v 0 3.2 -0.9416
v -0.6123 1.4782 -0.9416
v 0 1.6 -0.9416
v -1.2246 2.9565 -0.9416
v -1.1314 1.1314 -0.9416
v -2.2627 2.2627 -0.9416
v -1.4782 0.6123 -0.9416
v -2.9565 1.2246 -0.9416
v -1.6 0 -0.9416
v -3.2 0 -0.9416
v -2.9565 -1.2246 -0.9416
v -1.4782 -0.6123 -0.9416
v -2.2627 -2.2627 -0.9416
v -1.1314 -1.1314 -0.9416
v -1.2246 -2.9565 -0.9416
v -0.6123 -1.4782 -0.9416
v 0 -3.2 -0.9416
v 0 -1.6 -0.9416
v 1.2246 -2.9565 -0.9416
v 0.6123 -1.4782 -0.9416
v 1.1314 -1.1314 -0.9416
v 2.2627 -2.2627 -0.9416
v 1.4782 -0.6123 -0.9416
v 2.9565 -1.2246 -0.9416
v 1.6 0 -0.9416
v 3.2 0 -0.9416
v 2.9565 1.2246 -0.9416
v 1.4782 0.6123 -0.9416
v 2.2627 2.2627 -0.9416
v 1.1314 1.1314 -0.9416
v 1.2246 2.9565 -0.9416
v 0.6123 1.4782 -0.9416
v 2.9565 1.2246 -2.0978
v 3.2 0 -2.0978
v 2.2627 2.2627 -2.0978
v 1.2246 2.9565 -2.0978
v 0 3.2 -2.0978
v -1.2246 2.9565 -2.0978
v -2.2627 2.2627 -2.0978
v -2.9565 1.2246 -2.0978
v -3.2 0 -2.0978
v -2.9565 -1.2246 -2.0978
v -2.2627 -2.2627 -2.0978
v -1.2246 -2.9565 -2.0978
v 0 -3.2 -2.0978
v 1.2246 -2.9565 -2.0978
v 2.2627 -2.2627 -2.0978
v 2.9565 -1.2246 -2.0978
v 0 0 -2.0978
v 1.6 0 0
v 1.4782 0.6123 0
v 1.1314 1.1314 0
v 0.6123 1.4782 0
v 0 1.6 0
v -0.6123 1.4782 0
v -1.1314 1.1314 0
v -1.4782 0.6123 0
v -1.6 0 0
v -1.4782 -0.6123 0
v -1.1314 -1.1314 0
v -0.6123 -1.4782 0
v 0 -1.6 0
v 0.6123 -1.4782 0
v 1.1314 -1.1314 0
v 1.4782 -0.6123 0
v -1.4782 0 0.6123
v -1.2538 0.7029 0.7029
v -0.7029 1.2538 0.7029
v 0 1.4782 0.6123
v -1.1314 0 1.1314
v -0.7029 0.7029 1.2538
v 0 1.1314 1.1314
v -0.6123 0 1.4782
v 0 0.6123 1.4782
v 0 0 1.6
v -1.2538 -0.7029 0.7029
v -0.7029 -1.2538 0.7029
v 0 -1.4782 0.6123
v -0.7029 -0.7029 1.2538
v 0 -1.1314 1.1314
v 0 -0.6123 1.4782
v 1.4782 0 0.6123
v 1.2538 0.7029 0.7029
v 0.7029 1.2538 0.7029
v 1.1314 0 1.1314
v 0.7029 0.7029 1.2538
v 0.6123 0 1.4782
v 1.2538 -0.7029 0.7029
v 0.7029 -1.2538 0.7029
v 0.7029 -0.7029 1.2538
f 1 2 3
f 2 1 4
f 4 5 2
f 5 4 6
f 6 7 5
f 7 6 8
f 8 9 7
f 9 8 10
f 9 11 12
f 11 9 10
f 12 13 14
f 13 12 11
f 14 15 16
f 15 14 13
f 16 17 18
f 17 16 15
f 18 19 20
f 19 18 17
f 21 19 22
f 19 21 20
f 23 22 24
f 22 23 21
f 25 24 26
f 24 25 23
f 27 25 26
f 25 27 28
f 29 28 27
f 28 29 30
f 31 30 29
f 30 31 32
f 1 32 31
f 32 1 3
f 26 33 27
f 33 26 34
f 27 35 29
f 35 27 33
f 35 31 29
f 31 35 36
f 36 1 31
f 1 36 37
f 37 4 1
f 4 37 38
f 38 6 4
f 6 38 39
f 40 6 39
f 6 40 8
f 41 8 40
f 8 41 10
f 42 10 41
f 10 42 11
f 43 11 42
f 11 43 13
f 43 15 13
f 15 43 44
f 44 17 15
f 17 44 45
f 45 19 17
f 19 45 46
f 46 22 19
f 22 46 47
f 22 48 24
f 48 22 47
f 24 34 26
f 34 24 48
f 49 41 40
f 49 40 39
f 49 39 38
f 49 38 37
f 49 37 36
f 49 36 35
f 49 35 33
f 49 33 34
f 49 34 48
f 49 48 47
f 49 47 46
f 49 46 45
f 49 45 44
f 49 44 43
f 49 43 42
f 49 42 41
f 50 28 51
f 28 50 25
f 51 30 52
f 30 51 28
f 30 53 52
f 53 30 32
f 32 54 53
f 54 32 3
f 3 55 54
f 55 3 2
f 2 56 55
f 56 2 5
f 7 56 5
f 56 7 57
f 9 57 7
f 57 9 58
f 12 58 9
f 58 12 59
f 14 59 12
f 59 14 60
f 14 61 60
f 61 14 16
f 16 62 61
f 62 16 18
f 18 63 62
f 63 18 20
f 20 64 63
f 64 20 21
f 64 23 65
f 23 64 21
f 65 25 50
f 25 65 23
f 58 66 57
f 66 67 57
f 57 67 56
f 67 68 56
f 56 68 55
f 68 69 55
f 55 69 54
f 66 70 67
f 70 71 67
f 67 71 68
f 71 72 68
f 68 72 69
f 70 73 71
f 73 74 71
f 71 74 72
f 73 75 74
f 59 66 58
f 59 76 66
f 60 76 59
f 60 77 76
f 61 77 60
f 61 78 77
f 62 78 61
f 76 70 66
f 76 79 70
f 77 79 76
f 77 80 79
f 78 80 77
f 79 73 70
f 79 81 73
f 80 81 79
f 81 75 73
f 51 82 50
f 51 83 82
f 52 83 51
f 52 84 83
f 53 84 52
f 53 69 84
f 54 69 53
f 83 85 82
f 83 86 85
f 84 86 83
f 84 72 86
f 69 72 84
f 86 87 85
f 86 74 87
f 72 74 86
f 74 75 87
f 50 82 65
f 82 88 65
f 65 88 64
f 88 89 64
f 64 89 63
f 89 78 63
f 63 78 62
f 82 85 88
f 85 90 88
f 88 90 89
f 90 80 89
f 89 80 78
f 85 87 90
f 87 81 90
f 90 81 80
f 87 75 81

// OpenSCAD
// file: ../p/stud3.scad
use <../lib.scad>
use <4-4cyli.scad>
use <4-4disc.scad>
use <4-4edge.scad>
$fa=1; $fs=0.2;
function ldraw_lib__stud3(realsolid=false) = realsolid ? 
    [openscad(translate([0,0,-eps()], o=cylinder(4+eps(), r=4)),2)] : [
// 0 Stud Tube Solid
// 0 Name: stud3.dat
// 0 Author: James Jessiman
// 0 !LDRAW_ORG Primitive UPDATE 2012-01
// 0 !LICENSE Licensed under CC BY 2.0 and CC BY 4.0 : see CAreadme.txt
// 
// 0 BFC CERTIFY CCW
  [0,"BFC","CERTIFY"],
  [0,"BFC","CCW"],
// 
// 0 !HISTORY 2002-04-04 [sbliss] Modified for BFC compliance
// 0 !HISTORY 2002-04-25 [PTadmin] Official Update 2002-02
// 0 !HISTORY 2007-06-24 [PTadmin] Header formatted for Contributor Agreement
// 0 !HISTORY 2008-07-01 [PTadmin] Official Update 2008-01
// 0 !HISTORY 2012-02-16 [Philo] Changed to CCW
// 0 !HISTORY 2012-03-30 [PTadmin] Official Update 2012-01
// 
// 
// 1 16 0 -4 0 4 0 0 0 1 0 0 0 4 4-4edge.dat
  [1,16,0,-4,0,4,0,0,0,1,0,0,0,4, ldraw_lib__4_4edge(realsolid)],
// 1 16 0 0 0 4 0 0 0 1 0 0 0 4 4-4edge.dat
  [1,16,0,0,0,4,0,0,0,1,0,0,0,4, ldraw_lib__4_4edge(realsolid)],
// 1 16 0 -4 0 4 0 0 0 1 0 0 0 4 4-4disc.dat
  [1,16,0,-4,0,4,0,0,0,1,0,0,0,4, ldraw_lib__4_4disc(realsolid)],
// 1 16 0 -4 0 4 0 0 0 4 0 0 0 4 4-4cyli.dat
  [1,16,0,-4,0,4,0,0,0,4,0,0,0,4, ldraw_lib__4_4cyli(realsolid)],
];
module ldraw_lib__stud3(step=0, col=false, unit=2/5, alt=false, line=0.2, solid=!$preview)
    makepoly(ldraw_lib__stud3(solid), step=step, col=col, unit=unit, alt=alt, line=line, solid=solid);
ldraw_lib__stud3(line=0.2);
// file: ../p/stud.scad
use <../lib.scad>
use <4-4cyli.scad>
use <4-4disc.scad>
use <4-4edge.scad>
$fa=1; $fs=0.2;
function ldraw_lib__stud(realsolid=false) = realsolid ? 
    [openscad(translate([0,0,-eps()], o=cylinder(4+eps(), r=6)),2)] : [
// 0 Stud
// 0 Name: stud.dat
// 0 Author: James Jessiman
// 0 !LDRAW_ORG Primitive UPDATE 2012-01
// 0 !LICENSE Licensed under CC BY 2.0 and CC BY 4.0 : see CAreadme.txt
// 
// 0 BFC CERTIFY CCW
  [0,"BFC","CERTIFY"],
  [0,"BFC","CCW"],
// 
// 0 !HISTORY 2002-04-04 [sbliss] Modified for BFC compliance
// 0 !HISTORY 2002-04-25 [PTadmin] Official Update 2002-02
// 0 !HISTORY 2007-06-24 [PTadmin] Header formatted for Contributor Agreement
// 0 !HISTORY 2008-07-01 [PTadmin] Official Update 2008-01
// 0 !HISTORY 2012-02-16 [Philo] Changed to CCW
// 0 !HISTORY 2012-03-30 [PTadmin] Official Update 2012-01
// 
// 
// 1 16 0 0 0 6 0 0 0 1 0 0 0 6 4-4edge.dat
  [1,16,0,0,0,6,0,0,0,1,0,0,0,6, ldraw_lib__4_4edge(realsolid)],
// 1 16 0 -4 0 6 0 0 0 1 0 0 0 6 4-4edge.dat
  [1,16,0,-4,0,6,0,0,0,1,0,0,0,6, ldraw_lib__4_4edge(realsolid)],
// 1 16 0 0 0 6 0 0 0 -4 0 0 0 6 4-4cyli.dat
  [1,16,0,0,0,6,0,0,0,-4,0,0,0,6, ldraw_lib__4_4cyli(realsolid)],
// 1 16 0 -4 0 6 0 0 0 1 0 0 0 6 4-4disc.dat
  [1,16,0,-4,0,6,0,0,0,1,0,0,0,6, ldraw_lib__4_4disc(realsolid)],
];
module ldraw_lib__stud(step=0, col=false, unit=2/5, alt=false, line=0.2, solid=!$preview)
    makepoly(ldraw_lib__stud(solid), step=step, col=col, unit=unit, alt=alt, line=line, solid=solid);
ldraw_lib__stud(line=0.2);
// file: ../p/box5.scad
use <../lib.scad>
$fa=1; $fs=0.2;
function ldraw_lib__box5(realsolid=false) = [
// 0 Box with 5 Faces and All Edges
// 0 Name: box5.dat
// 0 Author: James Jessiman
// 0 !LDRAW_ORG Primitive UPDATE 2012-01
// 0 !LICENSE Licensed under CC BY 2.0 and CC BY 4.0 : see CAreadme.txt
// 
// 0 BFC CERTIFY CCW
  [0,"BFC","CERTIFY"],
  [0,"BFC","CCW"],
// 
// 0 !HISTORY 2002-04-03 [sbliss] Modified for BFC compliance
// 0 !HISTORY 2002-04-25 [PTadmin] Official Update 2002-02
// 0 !HISTORY 2007-06-24 [PTadmin] Header formatted for Contributor Agreement
// 0 !HISTORY 2008-07-01 [PTadmin] Official Update 2008-01
// 0 !HISTORY 2012-02-16 [Philo] Changed to CCW
// 0 !HISTORY 2012-03-30 [PTadmin] Official Update 2012-01
// 
// 
// 2 24 1 1 1 -1 1 1
  [2,24,1,1,1,-1,1,1],
// 2 24 -1 1 1 -1 1 -1
  [2,24,-1,1,1,-1,1,-1],
// 2 24 -1 1 -1 1 1 -1
  [2,24,-1,1,-1,1,1,-1],
// 2 24 1 1 -1 1 1 1
  [2,24,1,1,-1,1,1,1],
// 2 24 1 0 1 -1 0 1
  [2,24,1,0,1,-1,0,1],
// 2 24 -1 0 1 -1 0 -1
  [2,24,-1,0,1,-1,0,-1],
// 2 24 -1 0 -1 1 0 -1
  [2,24,-1,0,-1,1,0,-1],
// 2 24 1 0 -1 1 0 1
  [2,24,1,0,-1,1,0,1],
// 2 24 1 0 1 1 1 1
  [2,24,1,0,1,1,1,1],
// 2 24 -1 0 1 -1 1 1
  [2,24,-1,0,1,-1,1,1],
// 2 24 1 0 -1 1 1 -1
  [2,24,1,0,-1,1,1,-1],
// 2 24 -1 0 -1 -1 1 -1
  [2,24,-1,0,-1,-1,1,-1],
// 4 16 -1 1 1 1 1 1 1 1 -1 -1 1 -1
  [4,16,-1,1,1,1,1,1,1,1,-1,-1,1,-1],
// 4 16 -1 1 1 -1 0 1 1 0 1 1 1 1
  [4,16,-1,1,1,-1,0,1,1,0,1,1,1,1],
// 4 16 -1 1 -1 -1 0 -1 -1 0 1 -1 1 1
  [4,16,-1,1,-1,-1,0,-1,-1,0,1,-1,1,1],
// 4 16 1 1 -1 1 0 -1 -1 0 -1 -1 1 -1
  [4,16,1,1,-1,1,0,-1,-1,0,-1,-1,1,-1],
// 4 16 1 1 1 1 0 1 1 0 -1 1 1 -1
  [4,16,1,1,1,1,0,1,1,0,-1,1,1,-1],
];
module ldraw_lib__box5(step=0, col=false, unit=2/5, alt=false, line=0.2, solid=!$preview)
    makepoly(ldraw_lib__box5(solid), step=step, col=col, unit=unit, alt=alt, line=line, solid=solid);
ldraw_lib__box5(line=0.2);
// file: ../p/box4t.scad
use <../lib.scad>
$fa=1; $fs=0.2;
function ldraw_lib__box4t(realsolid=false) = [
// 0 Box with 4 Adjacent Faces and All Edges
// 0 Name: box4t.dat
// 0 Author: Tore Eriksson [Tore_Eriksson]
// 0 !LDRAW_ORG Primitive UPDATE 2003-02
// 0 !LICENSE Licensed under CC BY 2.0 and CC BY 4.0 : see CAreadme.txt
// 
// 0 BFC CERTIFY CCW
  [0,"BFC","CERTIFY"],
  [0,"BFC","CCW"],
// 
// 0 !HISTORY 1997-09-29 [PTadmin] Official Update 1997-15
// 0 !HISTORY 2002-08-31 [izanette] Modified with WINDZ for BFC compliance
// 0 !HISTORY 2003-08-01 [PTadmin] Official Update 2003-02
// 0 !HISTORY 2007-06-24 [PTadmin] Header formatted for Contributor Agreement
// 0 !HISTORY 2008-07-01 [PTadmin] Official Update 2008-01
// 
// 
// 2 24 1 1 1 -1 1 1
  [2,24,1,1,1,-1,1,1],
// 2 24 -1 1 1 -1 1 -1
  [2,24,-1,1,1,-1,1,-1],
// 2 24 -1 1 -1 1 1 -1
  [2,24,-1,1,-1,1,1,-1],
// 2 24 1 1 -1 1 1 1
  [2,24,1,1,-1,1,1,1],
// 2 24 1 0 1 -1 0 1
  [2,24,1,0,1,-1,0,1],
// 2 24 -1 0 1 -1 0 -1
  [2,24,-1,0,1,-1,0,-1],
// 2 24 -1 0 -1 1 0 -1
  [2,24,-1,0,-1,1,0,-1],
// 2 24 1 0 -1 1 0 1
  [2,24,1,0,-1,1,0,1],
// 2 24 1 0 1 1 1 1
  [2,24,1,0,1,1,1,1],
// 2 24 -1 0 1 -1 1 1
  [2,24,-1,0,1,-1,1,1],
// 2 24 1 0 -1 1 1 -1
  [2,24,1,0,-1,1,1,-1],
// 2 24 -1 0 -1 -1 1 -1
  [2,24,-1,0,-1,-1,1,-1],
// 4 16 1 1 1 1 1 -1 -1 1 -1 -1 1 1
  [4,16,1,1,1,1,1,-1,-1,1,-1,-1,1,1],
// 4 16 1 1 1 -1 1 1 -1 0 1 1 0 1
  [4,16,1,1,1,-1,1,1,-1,0,1,1,0,1],
// 4 16 -1 1 1 -1 1 -1 -1 0 -1 -1 0 1
  [4,16,-1,1,1,-1,1,-1,-1,0,-1,-1,0,1],
// 0 4 16 -1 1 -1 -1 0 -1 1 0 -1 1 1 -1
// 4 16 1 1 -1 1 1 1 1 0 1 1 0 -1
  [4,16,1,1,-1,1,1,1,1,0,1,1,0,-1],
// 0
];
module ldraw_lib__box4t(step=0, col=false, unit=2/5, alt=false, line=0.2, solid=!$preview)
    makepoly(ldraw_lib__box4t(solid), step=step, col=col, unit=unit, alt=alt, line=line, solid=solid);
ldraw_lib__box4t(line=0.2);
// file: s/3004s01.scad
use <../../lib.scad>
use <../../p/box4t.scad>
use <../../p/box5.scad>
use <../../p/stud.scad>
use <../../p/stud3.scad>
$fa=1; $fs=0.2;
function ldraw_lib__s__3004s01(realsolid=false) = [
// 0 ~Brick  1 x  2 without Front Face
// 0 Name: s\3004s01.dat
// 0 Author: James Jessiman
// 0 !LDRAW_ORG Subpart UPDATE 2003-03
// 0 !LICENSE Licensed under CC BY 2.0 and CC BY 4.0 : see CAreadme.txt
// 
// 0 BFC CERTIFY CCW
  [0,"BFC","CERTIFY"],
  [0,"BFC","CCW"],
// 
// 0 !HISTORY 2003-09-07 [jriley] Subfiling, BFC
// 0 !HISTORY 2003-12-19 [PTadmin] Official Update 2003-03
// 0 !HISTORY 2007-08-29 [PTadmin] Header formatted for Contributor Agreement
// 0 !HISTORY 2008-07-01 [PTadmin] Official Update 2008-01
// 
// 
// 1 16 0 4 0 1 0 0 0 -5 0 0 0 1 stud3.dat
  [1,16,0,4,0,1,0,0,0,-5,0,0,0,1, ldraw_lib__stud3(realsolid)],
// 0 BFC INVERTNEXT
  [0,"BFC","INVERTNEXT"],
// 1 16 0 24 0 16 0 0 0 -20 0 0 0 6 box5.dat
  [1,16,0,24,0,16,0,0,0,-20,0,0,0,6, ldraw_lib__box5(realsolid)],
// 4 16 20 24 10 16 24 6 -16 24 6 -20 24 10
  [4,16,20,24,10,16,24,6,-16,24,6,-20,24,10],
// 4 16 -20 24 10 -16 24 6 -16 24 -6 -20 24 -10
  [4,16,-20,24,10,-16,24,6,-16,24,-6,-20,24,-10],
// 4 16 -20 24 -10 -16 24 -6 16 24 -6 20 24 -10
  [4,16,-20,24,-10,-16,24,-6,16,24,-6,20,24,-10],
// 4 16 20 24 -10 16 24 -6 16 24 6 20 24 10
  [4,16,20,24,-10,16,24,-6,16,24,6,20,24,10],
// 1 16 0 24 0 20 0 0 0 -24 0 0 0 10 box4t.dat
  [1,16,0,24,0,20,0,0,0,-24,0,0,0,10, ldraw_lib__box4t(realsolid)],
// 1 16 10 0 0 1 0 0 0 1 0 0 0 1 stud.dat
  [1,16,10,0,0,1,0,0,0,1,0,0,0,1, ldraw_lib__stud(realsolid)],
// 1 16 -10 0 0 1 0 0 0 1 0 0 0 1 stud.dat
  [1,16,-10,0,0,1,0,0,0,1,0,0,0,1, ldraw_lib__stud(realsolid)],
// 0
];
module ldraw_lib__s__3004s01(step=0, col=false, unit=2/5, alt=false, line=0.2, solid=!$preview)
    makepoly(ldraw_lib__s__3004s01(solid), step=step, col=col, unit=unit, alt=alt, line=line, solid=solid);
ldraw_lib__s__3004s01(line=0.2);
// file: ../p/1-8sphe.scad
use <../lib.scad>
$fa=1; $fs=0.2;
function ldraw_lib__1_8sphe(realsolid=false) = [
// 0 Sphere 0.125
// 0 Name: 1-8sphe.dat
// 0 Author: James Jessiman
// 0 !LDRAW_ORG Primitive UPDATE 2012-03
// 0 !LICENSE Licensed under CC BY 2.0 and CC BY 4.0 : see CAreadme.txt
// 
// 0 BFC CERTIFY CCW
  [0,"BFC","CERTIFY"],
  [0,"BFC","CCW"],
// 
// 0 !HISTORY 2000-08-01 {Axel Poque} fixes to resolve L3P error messages.
// 0 !HISTORY 2000-08-01 {Manfred Moolhuysen} fixes to resolve L3P error messages.
// 0 !HISTORY 2000-09-30 [PTadmin] Official Update 2000-02
// 0 !HISTORY 2002-03-28 [hafhead] Made BFC compliant
// 0 !HISTORY 2002-04-25 [PTadmin] Official Update 2002-02
// 0 !HISTORY 2007-06-22 [PTadmin] Header formatted for Contributor Agreement
// 0 !HISTORY 2008-07-01 [PTadmin] Official Update 2008-01
// 0 !HISTORY 2010-09-12 [MagFors] Changed winding, removed duplicated cond-line, optimized filesize
// 0 !HISTORY 2010-12-31 [PTadmin] Official Update 2010-03
// 0 !HISTORY 2012-07-01 [tcobbs] Replaced with geometry from LDView
// 0 !HISTORY 2012-12-28 [PTadmin] Official Update 2012-03
// 
// 
// 3 16 1 0 0 0.9239 0.3827 0 0.9239 0 0.3827
  [3,16,1,0,0,0.9239,0.3827,0,0.9239,0,0.3827],
// 3 16 0.9239 0.3827 0 0.7836 0.4393 0.4393 0.9239 0 0.3827
  [3,16,0.9239,0.3827,0,0.7836,0.4393,0.4393,0.9239,0,0.3827],
// 3 16 0.9239 0 0.3827 0.7836 0.4393 0.4393 0.7071 0 0.7071
  [3,16,0.9239,0,0.3827,0.7836,0.4393,0.4393,0.7071,0,0.7071],
// 3 16 0.7836 0.4393 0.4393 0.4393 0.4393 0.7836 0.7071 0 0.7071
  [3,16,0.7836,0.4393,0.4393,0.4393,0.4393,0.7836,0.7071,0,0.7071],
// 3 16 0.7071 0 0.7071 0.4393 0.4393 0.7836 0.3827 0 0.9239
  [3,16,0.7071,0,0.7071,0.4393,0.4393,0.7836,0.3827,0,0.9239],
// 3 16 0.4393 0.4393 0.7836 0 0.3827 0.9239 0.3827 0 0.9239
  [3,16,0.4393,0.4393,0.7836,0,0.3827,0.9239,0.3827,0,0.9239],
// 3 16 0.3827 0 0.9239 0 0.3827 0.9239 0 0 1
  [3,16,0.3827,0,0.9239,0,0.3827,0.9239,0,0,1],
// 3 16 0.9239 0.3827 0 0.7071 0.7071 0 0.7836 0.4393 0.4393
  [3,16,0.9239,0.3827,0,0.7071,0.7071,0,0.7836,0.4393,0.4393],
// 3 16 0.7071 0.7071 0 0.4393 0.7836 0.4393 0.7836 0.4393 0.4393
  [3,16,0.7071,0.7071,0,0.4393,0.7836,0.4393,0.7836,0.4393,0.4393],
// 3 16 0.7836 0.4393 0.4393 0.4393 0.7836 0.4393 0.4393 0.4393 0.7836
  [3,16,0.7836,0.4393,0.4393,0.4393,0.7836,0.4393,0.4393,0.4393,0.7836],
// 3 16 0.4393 0.7836 0.4393 0 0.7071 0.7071 0.4393 0.4393 0.7836
  [3,16,0.4393,0.7836,0.4393,0,0.7071,0.7071,0.4393,0.4393,0.7836],
// 3 16 0.4393 0.4393 0.7836 0 0.7071 0.7071 0 0.3827 0.9239
  [3,16,0.4393,0.4393,0.7836,0,0.7071,0.7071,0,0.3827,0.9239],
// 3 16 0.7071 0.7071 0 0.3827 0.9239 0 0.4393 0.7836 0.4393
  [3,16,0.7071,0.7071,0,0.3827,0.9239,0,0.4393,0.7836,0.4393],
// 3 16 0.3827 0.9239 0 0 0.9239 0.3827 0.4393 0.7836 0.4393
  [3,16,0.3827,0.9239,0,0,0.9239,0.3827,0.4393,0.7836,0.4393],
// 3 16 0.4393 0.7836 0.4393 0 0.9239 0.3827 0 0.7071 0.7071
  [3,16,0.4393,0.7836,0.4393,0,0.9239,0.3827,0,0.7071,0.7071],
// 3 16 0.3827 0.9239 0 0 1 0 0 0.9239 0.3827
  [3,16,0.3827,0.9239,0,0,1,0,0,0.9239,0.3827],
// 
// 5 24 1 0 0 0.9239 0.3827 0 1 0 -0.1 0.9239 0 0.3827
  [5,24,1,0,0,0.9239,0.3827,0,1,0,-0.1,0.9239,0,0.3827],
// 5 24 0.9239 0.3827 0 0.9239 0 0.3827 1 0 0 0.7836 0.4393 0.4393
  [5,24,0.9239,0.3827,0,0.9239,0,0.3827,1,0,0,0.7836,0.4393,0.4393],
// 5 24 1 0 0 0.9239 0 0.3827 0.9239 0.3827 0 1 -0.1 0
  [5,24,1,0,0,0.9239,0,0.3827,0.9239,0.3827,0,1,-0.1,0],
// 5 24 0.9239 0 0.3827 0.7836 0.4393 0.4393 0.9239 0.3827 0 0.7071 0 0.7071
  [5,24,0.9239,0,0.3827,0.7836,0.4393,0.4393,0.9239,0.3827,0,0.7071,0,0.7071],
// 5 24 0.7836 0.4393 0.4393 0.7071 0 0.7071 0.9239 0 0.3827 0.4393 0.4393 0.7836
  [5,24,0.7836,0.4393,0.4393,0.7071,0,0.7071,0.9239,0,0.3827,0.4393,0.4393,0.7836],
// 5 24 0.9239 0 0.3827 0.7071 0 0.7071 0.7836 0.4393 0.4393 0.9239 -0.1 0.3827
  [5,24,0.9239,0,0.3827,0.7071,0,0.7071,0.7836,0.4393,0.4393,0.9239,-0.1,0.3827],
// 5 24 0.7071 0 0.7071 0.4393 0.4393 0.7836 0.7836 0.4393 0.4393 0.3827 0 0.9239
  [5,24,0.7071,0,0.7071,0.4393,0.4393,0.7836,0.7836,0.4393,0.4393,0.3827,0,0.9239],
// 5 24 0.4393 0.4393 0.7836 0.3827 0 0.9239 0.7071 0 0.7071 0 0.3827 0.9239
  [5,24,0.4393,0.4393,0.7836,0.3827,0,0.9239,0.7071,0,0.7071,0,0.3827,0.9239],
// 5 24 0.7071 0 0.7071 0.3827 0 0.9239 0.4393 0.4393 0.7836 0.7071 -0.1 0.7071
  [5,24,0.7071,0,0.7071,0.3827,0,0.9239,0.4393,0.4393,0.7836,0.7071,-0.1,0.7071],
// 5 24 0.3827 0 0.9239 0 0.3827 0.9239 0.4393 0.4393 0.7836 0 0 1
  [5,24,0.3827,0,0.9239,0,0.3827,0.9239,0.4393,0.4393,0.7836,0,0,1],
// 5 24 0 0.3827 0.9239 0 0 1 0.3827 0 0.9239 -0.1 0.3827 0.9239
  [5,24,0,0.3827,0.9239,0,0,1,0.3827,0,0.9239,-0.1,0.3827,0.9239],
// 5 24 0.3827 0 0.9239 0 0 1 0 0.3827 0.9239 0.3827 -0.1 0.9239
  [5,24,0.3827,0,0.9239,0,0,1,0,0.3827,0.9239,0.3827,-0.1,0.9239],
// 5 24 0.9239 0.3827 0 0.7071 0.7071 0 0.9239 0.3827 -0.1 0.7836 0.4393 0.4393
  [5,24,0.9239,0.3827,0,0.7071,0.7071,0,0.9239,0.3827,-0.1,0.7836,0.4393,0.4393],
// 5 24 0.7071 0.7071 0 0.7836 0.4393 0.4393 0.9239 0.3827 0 0.4393 0.7836 0.4393
  [5,24,0.7071,0.7071,0,0.7836,0.4393,0.4393,0.9239,0.3827,0,0.4393,0.7836,0.4393],
// 5 24 0.9239 0.3827 0 0.7836 0.4393 0.4393 0.7071 0.7071 0 0.9239 0 0.3827
  [5,24,0.9239,0.3827,0,0.7836,0.4393,0.4393,0.7071,0.7071,0,0.9239,0,0.3827],
// 5 24 0.7836 0.4393 0.4393 0.4393 0.7836 0.4393 0.7071 0.7071 0 0.4393 0.4393 0.7836
  [5,24,0.7836,0.4393,0.4393,0.4393,0.7836,0.4393,0.7071,0.7071,0,0.4393,0.4393,0.7836],
// 5 24 0.4393 0.7836 0.4393 0.4393 0.4393 0.7836 0.7836 0.4393 0.4393 0 0.7071 0.7071
  [5,24,0.4393,0.7836,0.4393,0.4393,0.4393,0.7836,0.7836,0.4393,0.4393,0,0.7071,0.7071],
// 5 24 0.7836 0.4393 0.4393 0.4393 0.4393 0.7836 0.4393 0.7836 0.4393 0.7071 0 0.7071
  [5,24,0.7836,0.4393,0.4393,0.4393,0.4393,0.7836,0.4393,0.7836,0.4393,0.7071,0,0.7071],
// 5 24 0.4393 0.4393 0.7836 0 0.7071 0.7071 0.4393 0.7836 0.4393 0 0.3827 0.9239
  [5,24,0.4393,0.4393,0.7836,0,0.7071,0.7071,0.4393,0.7836,0.4393,0,0.3827,0.9239],
// 5 24 0 0.7071 0.7071 0 0.3827 0.9239 0.4393 0.4393 0.7836 -0.1 0.7071 0.7071
  [5,24,0,0.7071,0.7071,0,0.3827,0.9239,0.4393,0.4393,0.7836,-0.1,0.7071,0.7071],
// 5 24 0.4393 0.4393 0.7836 0 0.3827 0.9239 0 0.7071 0.7071 0.3827 0 0.9239
  [5,24,0.4393,0.4393,0.7836,0,0.3827,0.9239,0,0.7071,0.7071,0.3827,0,0.9239],
// 5 24 0.7071 0.7071 0 0.3827 0.9239 0 0.7071 0.7071 -0.1 0.4393 0.7836 0.4393
  [5,24,0.7071,0.7071,0,0.3827,0.9239,0,0.7071,0.7071,-0.1,0.4393,0.7836,0.4393],
// 5 24 0.3827 0.9239 0 0.4393 0.7836 0.4393 0.7071 0.7071 0 0 0.9239 0.3827
  [5,24,0.3827,0.9239,0,0.4393,0.7836,0.4393,0.7071,0.7071,0,0,0.9239,0.3827],
// 5 24 0.7071 0.7071 0 0.4393 0.7836 0.4393 0.3827 0.9239 0 0.7836 0.4393 0.4393
  [5,24,0.7071,0.7071,0,0.4393,0.7836,0.4393,0.3827,0.9239,0,0.7836,0.4393,0.4393],
// 5 24 0.4393 0.7836 0.4393 0 0.9239 0.3827 0.3827 0.9239 0 0 0.7071 0.7071
  [5,24,0.4393,0.7836,0.4393,0,0.9239,0.3827,0.3827,0.9239,0,0,0.7071,0.7071],
// 5 24 0 0.9239 0.3827 0 0.7071 0.7071 0.4393 0.7836 0.4393 -0.1 0.9239 0.3827
  [5,24,0,0.9239,0.3827,0,0.7071,0.7071,0.4393,0.7836,0.4393,-0.1,0.9239,0.3827],
// 5 24 0.4393 0.7836 0.4393 0 0.7071 0.7071 0 0.9239 0.3827 0.4393 0.4393 0.7836
  [5,24,0.4393,0.7836,0.4393,0,0.7071,0.7071,0,0.9239,0.3827,0.4393,0.4393,0.7836],
// 5 24 0.3827 0.9239 0 0 1 0 0.3827 0.9239 -0.1 0 0.9239 0.3827
  [5,24,0.3827,0.9239,0,0,1,0,0.3827,0.9239,-0.1,0,0.9239,0.3827],
// 5 24 0 1 0 0 0.9239 0.3827 0.3827 0.9239 0 -0.1 1 0
  [5,24,0,1,0,0,0.9239,0.3827,0.3827,0.9239,0,-0.1,1,0],
// 5 24 0.3827 0.9239 0 0 0.9239 0.3827 0 1 0 0.4393 0.7836 0.4393
  [5,24,0.3827,0.9239,0,0,0.9239,0.3827,0,1,0,0.4393,0.7836,0.4393],
];
module ldraw_lib__1_8sphe(step=0, col=false, unit=2/5, alt=false, line=0.2, solid=!$preview)
    makepoly(ldraw_lib__1_8sphe(solid), step=step, col=col, unit=unit, alt=alt, line=line, solid=solid);
ldraw_lib__1_8sphe(line=0.2);
// file: 3004.scad
use <../lib.scad>
use <s/3004s01.scad>
$fa=1; $fs=0.2;
function ldraw_lib__3004(realsolid=false) = [
// 0 Brick  1 x  2
// 0 Name: 3004.dat
// 0 Author: James Jessiman
// 0 !LDRAW_ORG Part UPDATE 2022-05
// 0 !LICENSE Licensed under CC BY 2.0 and CC BY 4.0 : see CAreadme.txt
// 
// 0 BFC CERTIFY CCW
  [0,"BFC","CERTIFY"],
  [0,"BFC","CCW"],
// 
// 0 !HISTORY 2001-10-26 [PTadmin] Official Update 2001-01
// 0 !HISTORY 2002-05-07 {unknown} BFC Certification
// 0 !HISTORY 2002-06-11 [PTadmin] Official Update 2002-03
// 0 !HISTORY 2007-05-07 [PTadmin] Header formatted for Contributor Agreement
// 0 !HISTORY 2008-07-01 [PTadmin] Official Update 2008-01
// 0 !HISTORY 2022-08-04 [MagFors] Using subfile
// 0 !HISTORY 2022-09-15 [PTadmin] Official Update 2022-05
// 
// 
// 1 16 0 0 0 1 0 0 0 1 0 0 0 1 s\3004s01.dat
  [1,16,0,0,0,1,0,0,0,1,0,0,0,1, ldraw_lib__s__3004s01(realsolid)],
// 4 16 -20 24 -10 20 24 -10 20 0 -10 -20 0 -10
  [4,16,-20,24,-10,20,24,-10,20,0,-10,-20,0,-10],
];
module ldraw_lib__3004(step=0, col=false, unit=2/5, alt=false, line=0.2, solid=!$preview)
    makepoly(ldraw_lib__3004(solid), step=step, col=col, unit=unit, alt=alt, line=line, solid=solid);
ldraw_lib__3004(line=0.2);
// file: ../p/4-8sphe.scad
use <../lib.scad>
use <1-8sphe.scad>
$fa=1; $fs=0.2;
function ldraw_lib__4_8sphe(realsolid=false) = [
// 0 Sphere 0.5
// 0 Name: 4-8sphe.dat
// 0 Author: James Jessiman
// 0 !LDRAW_ORG Primitive UPDATE 2003-02
// 0 !LICENSE Licensed under CC BY 2.0 and CC BY 4.0 : see CAreadme.txt
// 
// 0 BFC CERTIFY CCW
  [0,"BFC","CERTIFY"],
  [0,"BFC","CCW"],
// 
// 0 !HISTORY 2002-08-31 [izanette] Modified with WINDZ for BFC compliance
// 0 !HISTORY 2003-08-01 [PTadmin] Official Update 2003-02
// 0 !HISTORY 2007-06-24 [PTadmin] Header formatted for Contributor Agreement
// 0 !HISTORY 2008-07-01 [PTadmin] Official Update 2008-01
// 
// 
// 1 16 0 0 0 1 0 0 0 1 0 0 0 1 1-8sphe.dat
  [1,16,0,0,0,1,0,0,0,1,0,0,0,1, ldraw_lib__1_8sphe(realsolid)],
// 1 16 0 0 0 1 0 0 0 1 0 0 0 -1 1-8sphe.dat
  [1,16,0,0,0,1,0,0,0,1,0,0,0,-1, ldraw_lib__1_8sphe(realsolid)],
// 1 16 0 0 0 -1 0 0 0 1 0 0 0 1 1-8sphe.dat
  [1,16,0,0,0,-1,0,0,0,1,0,0,0,1, ldraw_lib__1_8sphe(realsolid)],
// 1 16 0 0 0 -1 0 0 0 1 0 0 0 -1 1-8sphe.dat
  [1,16,0,0,0,-1,0,0,0,1,0,0,0,-1, ldraw_lib__1_8sphe(realsolid)],
// 0
// 
];
module ldraw_lib__4_8sphe(step=0, col=false, unit=2/5, alt=false, line=0.2, solid=!$preview)
    makepoly(ldraw_lib__4_8sphe(solid), step=step, col=col, unit=unit, alt=alt, line=line, solid=solid);
ldraw_lib__4_8sphe(line=0.2);
// file: ../p/4-4ring1.scad
use <../lib.scad>
$fa=1; $fs=0.2;
function ldraw_lib__4_4ring1(realsolid=false) = [
// 0 Ring  1 x 1.0
// 0 Name: 4-4ring1.dat
// 0 Author: James Jessiman
// 0 !LDRAW_ORG Primitive UPDATE 2009-01
// 0 !LICENSE Licensed under CC BY 2.0 and CC BY 4.0 : see CAreadme.txt
// 
// 0 BFC CERTIFY CCW
  [0,"BFC","CERTIFY"],
  [0,"BFC","CCW"],
// 
// 0 !HISTORY 1998-12-15 [PTadmin] Official Update 1998-10
// 0 !HISTORY 2002-04-08 [BrickCaster] Modified for BFC compliance
// 0 !HISTORY 2002-04-25 [PTadmin] Official Update 2002-02
// 0 !HISTORY 2007-06-24 [PTadmin] Header formatted for Contributor Agreement
// 0 !HISTORY 2008-07-01 [PTadmin] Official Update 2008-01
// 0 !HISTORY 2008-08-26 [cwdee] Switch polygon winding and rename
// 0 !HISTORY 2009-05-02 [PTadmin] Official Update 2009-01
// 
// 
// 4 16 -0.7654 0 1.8478 -0.3827 0 0.9239 0 0 1 0 0 2
  [4,16,-0.7654,0,1.8478,-0.3827,0,0.9239,0,0,1,0,0,2],
// 4 16 -1.4142 0 1.4142 -0.7071 0 0.7071 -0.3827 0 0.9239 -0.7654 0 1.8478
  [4,16,-1.4142,0,1.4142,-0.7071,0,0.7071,-0.3827,0,0.9239,-0.7654,0,1.8478],
// 4 16 -1.8478 0 0.7654 -0.9239 0 0.3827 -0.7071 0 0.7071 -1.4142 0 1.41420
  [4,16,-1.8478,0,0.7654,-0.9239,0,0.3827,-0.7071,0,0.7071,-1.4142,0,1.41420],
// 4 16 -2 0 0 -1 0 0 -0.9239 0 0.3827 -1.8478 0 0.7654
  [4,16,-2,0,0,-1,0,0,-0.9239,0,0.3827,-1.8478,0,0.7654],
// 4 16 -1.8478 0 -0.7654 -0.9239 0 -0.3827 -1 0 0 -2 0 0
  [4,16,-1.8478,0,-0.7654,-0.9239,0,-0.3827,-1,0,0,-2,0,0],
// 4 16 -1.4142 0 -1.4142 -0.7071 0 -0.7071 -0.9239 0 -0.3827 -1.8478 0 -0.7654
  [4,16,-1.4142,0,-1.4142,-0.7071,0,-0.7071,-0.9239,0,-0.3827,-1.8478,0,-0.7654],
// 4 16 -0.7654 0 -1.8478 -0.3827 0 -0.9239 -0.7071 0 -0.7071 -1.4142 0 -1.4142
  [4,16,-0.7654,0,-1.8478,-0.3827,0,-0.9239,-0.7071,0,-0.7071,-1.4142,0,-1.4142],
// 4 16 0 0 -2 0 0 -1 -0.3827 0 -0.9239 -0.7654 0 -1.8478
  [4,16,0,0,-2,0,0,-1,-0.3827,0,-0.9239,-0.7654,0,-1.8478],
// 4 16 0.7654 0 -1.8478 0.3827 0 -0.9239 0 0 -1 0 0 -2
  [4,16,0.7654,0,-1.8478,0.3827,0,-0.9239,0,0,-1,0,0,-2],
// 4 16 1.4142 0 -1.4142 0.7071 0 -0.7071 0.3827 0 -0.9239 0.7654 0 -1.8478
  [4,16,1.4142,0,-1.4142,0.7071,0,-0.7071,0.3827,0,-0.9239,0.7654,0,-1.8478],
// 4 16 1.8478 0 -0.7654 0.9239 0 -0.3827 0.7071 0 -0.7071 1.4142 0 -1.4142
  [4,16,1.8478,0,-0.7654,0.9239,0,-0.3827,0.7071,0,-0.7071,1.4142,0,-1.4142],
// 4 16 2 0 0 1 0 0 0.9239 0 -0.3827 1.8478 0 -0.7654
  [4,16,2,0,0,1,0,0,0.9239,0,-0.3827,1.8478,0,-0.7654],
// 4 16 1.8478 0 0.7654 0.9239 0 0.3827 1 0 0 2 0 0
  [4,16,1.8478,0,0.7654,0.9239,0,0.3827,1,0,0,2,0,0],
// 4 16 1.4142 0 1.4142 0.7071 0 0.7071 0.9239 0 0.3827 1.8478 0 0.7654
  [4,16,1.4142,0,1.4142,0.7071,0,0.7071,0.9239,0,0.3827,1.8478,0,0.7654],
// 4 16 0.7654 0 1.8478 0.3827 0 0.9239 0.7071 0 0.7071 1.4142 0 1.4142
  [4,16,0.7654,0,1.8478,0.3827,0,0.9239,0.7071,0,0.7071,1.4142,0,1.4142],
// 4 16 0 0 2 0 0 1 0.3827 0 0.9239 0.7654 0 1.8478
  [4,16,0,0,2,0,0,1,0.3827,0,0.9239,0.7654,0,1.8478],
// 0
];
module ldraw_lib__4_4ring1(step=0, col=false, unit=2/5, alt=false, line=0.2, solid=!$preview)
    makepoly(ldraw_lib__4_4ring1(solid), step=step, col=col, unit=unit, alt=alt, line=line, solid=solid);
ldraw_lib__4_4ring1(line=0.2);
// file: ../p/4-4edge.scad
use <../lib.scad>
$fa=1; $fs=0.2;
function ldraw_lib__4_4edge(realsolid=false) = [
// 0 Circle 1.0
// 0 Name: 4-4edge.dat
// 0 Author: James Jessiman
// 0 !LDRAW_ORG Primitive UPDATE 2017-01
// 0 !LICENSE Licensed under CC BY 2.0 and CC BY 4.0 : see CAreadme.txt
// 
// 0 BFC CERTIFY CCW
  [0,"BFC","CERTIFY"],
  [0,"BFC","CCW"],
// 
// 0 !HISTORY 1998-12-15 [PTadmin] Official Update 1998-10
// 0 !HISTORY 2005-12-28 [PTadmin] Official Update 2005-01
// 0 !HISTORY 2007-06-24 [PTadmin] Header formatted for Contributor Agreement
// 0 !HISTORY 2008-07-01 [PTadmin] Official Update 2008-01
// 0 !HISTORY 2017-01-15 [Steffen] BFCed
// 0 !HISTORY 2017-12-30 [PTadmin] Official Update 2017-01
// 
// 
// 2 24 1 0 0 0.9239 0 0.3827
  [2,24,1,0,0,0.9239,0,0.3827],
// 2 24 0.9239 0 0.3827 0.7071 0 0.7071
  [2,24,0.9239,0,0.3827,0.7071,0,0.7071],
// 2 24 0.7071 0 0.7071 0.3827 0 0.9239
  [2,24,0.7071,0,0.7071,0.3827,0,0.9239],
// 2 24 0.3827 0 0.9239 0 0 1
  [2,24,0.3827,0,0.9239,0,0,1],
// 2 24 0 0 1 -0.3827 0 0.9239
  [2,24,0,0,1,-0.3827,0,0.9239],
// 2 24 -0.3827 0 0.9239 -0.7071 0 0.7071
  [2,24,-0.3827,0,0.9239,-0.7071,0,0.7071],
// 2 24 -0.7071 0 0.7071 -0.9239 0 0.3827
  [2,24,-0.7071,0,0.7071,-0.9239,0,0.3827],
// 2 24 -0.9239 0 0.3827 -1 0 -0
  [2,24,-0.9239,0,0.3827,-1,0,-0],
// 2 24 -1 0 -0 -0.9239 0 -0.3827
  [2,24,-1,0,-0,-0.9239,0,-0.3827],
// 2 24 -0.9239 0 -0.3827 -0.7071 0 -0.7071
  [2,24,-0.9239,0,-0.3827,-0.7071,0,-0.7071],
// 2 24 -0.7071 0 -0.7071 -0.3827 0 -0.9239
  [2,24,-0.7071,0,-0.7071,-0.3827,0,-0.9239],
// 2 24 -0.3827 0 -0.9239 0 0 -1
  [2,24,-0.3827,0,-0.9239,0,0,-1],
// 2 24 0 0 -1 0.3827 0 -0.9239
  [2,24,0,0,-1,0.3827,0,-0.9239],
// 2 24 0.3827 0 -0.9239 0.7071 0 -0.7071
  [2,24,0.3827,0,-0.9239,0.7071,0,-0.7071],
// 2 24 0.7071 0 -0.7071 0.9239 0 -0.3827
  [2,24,0.7071,0,-0.7071,0.9239,0,-0.3827],
// 2 24 0.9239 0 -0.3827 1 0 0
  [2,24,0.9239,0,-0.3827,1,0,0],
];
module ldraw_lib__4_4edge(step=0, col=false, unit=2/5, alt=false, line=0.2, solid=!$preview)
    makepoly(ldraw_lib__4_4edge(solid), step=step, col=col, unit=unit, alt=alt, line=line, solid=solid);
ldraw_lib__4_4edge(line=0.2);
// file: ../p/4-4disc.scad
use <../lib.scad>
$fa=1; $fs=0.2;
function ldraw_lib__4_4disc(realsolid=false) = [
// 0 Disc 1.0
// 0 Name: 4-4disc.dat
// 0 Author: James Jessiman
// 0 !LDRAW_ORG Primitive UPDATE 2002-02
// 0 !LICENSE Licensed under CC BY 2.0 and CC BY 4.0 : see CAreadme.txt
// 
// 0 BFC CERTIFY CCW
  [0,"BFC","CERTIFY"],
  [0,"BFC","CCW"],
// 
// 0 !HISTORY 1998-12-15 [PTadmin] Official Update 1998-10
// 0 !HISTORY 2002-03-23 [sbliss] Added BFC statement
// 0 !HISTORY 2002-04-25 [PTadmin] Official Update 2002-02
// 0 !HISTORY 2007-06-24 [PTadmin] Header formatted for Contributor Agreement
// 0 !HISTORY 2008-07-01 [PTadmin] Official Update 2008-01
// 
// 
// 3 16 0 0 0 1 0 0 0.9239 0 0.3827
  [3,16,0,0,0,1,0,0,0.9239,0,0.3827],
// 3 16 0 0 0 0.9239 0 0.3827 0.7071 0 0.7071
  [3,16,0,0,0,0.9239,0,0.3827,0.7071,0,0.7071],
// 3 16 0 0 0 0.7071 0 0.7071 0.3827 0 0.9239
  [3,16,0,0,0,0.7071,0,0.7071,0.3827,0,0.9239],
// 3 16 0 0 0 0.3827 0 0.9239 0 0 1
  [3,16,0,0,0,0.3827,0,0.9239,0,0,1],
// 3 16 0 0 0 0 0 1 -0.3827 0 0.9239
  [3,16,0,0,0,0,0,1,-0.3827,0,0.9239],
// 3 16 0 0 0 -0.3827 0 0.9239 -0.7071 0 0.7071
  [3,16,0,0,0,-0.3827,0,0.9239,-0.7071,0,0.7071],
// 3 16 0 0 0 -0.7071 0 0.7071 -0.9239 0 0.3827
  [3,16,0,0,0,-0.7071,0,0.7071,-0.9239,0,0.3827],
// 3 16 0 0 0 -0.9239 0 0.3827 -1 0 -0
  [3,16,0,0,0,-0.9239,0,0.3827,-1,0,-0],
// 3 16 0 0 0 -1 0 -0 -0.9239 0 -0.3827
  [3,16,0,0,0,-1,0,-0,-0.9239,0,-0.3827],
// 3 16 0 0 0 -0.9239 0 -0.3827 -0.7071 0 -0.7071
  [3,16,0,0,0,-0.9239,0,-0.3827,-0.7071,0,-0.7071],
// 3 16 0 0 0 -0.7071 0 -0.7071 -0.3827 0 -0.9239
  [3,16,0,0,0,-0.7071,0,-0.7071,-0.3827,0,-0.9239],
// 3 16 0 0 0 -0.3827 0 -0.9239 0 0 -1
  [3,16,0,0,0,-0.3827,0,-0.9239,0,0,-1],
// 3 16 0 0 0 0 0 -1 0.3827 0 -0.9239
  [3,16,0,0,0,0,0,-1,0.3827,0,-0.9239],
// 3 16 0 0 0 0.3827 0 -0.9239 0.7071 0 -0.7071
  [3,16,0,0,0,0.3827,0,-0.9239,0.7071,0,-0.7071],
// 3 16 0 0 0 0.7071 0 -0.7071 0.9239 0 -0.3827
  [3,16,0,0,0,0.7071,0,-0.7071,0.9239,0,-0.3827],
// 3 16 0 0 0 0.9239 0 -0.3827 1 0 0
  [3,16,0,0,0,0.9239,0,-0.3827,1,0,0],
// 0
];
module ldraw_lib__4_4disc(step=0, col=false, unit=2/5, alt=false, line=0.2, solid=!$preview)
    makepoly(ldraw_lib__4_4disc(solid), step=step, col=col, unit=unit, alt=alt, line=line, solid=solid);
ldraw_lib__4_4disc(line=0.2);
// file: ../p/4-4cyli.scad
use <../lib.scad>
$fa=1; $fs=0.2;
function ldraw_lib__4_4cyli(realsolid=false) = [
// 0 Cylinder 1.0
// 0 Name: 4-4cyli.dat
// 0 Author: James Jessiman
// 0 !LDRAW_ORG Primitive UPDATE 2005-01
// 0 !LICENSE Licensed under CC BY 2.0 and CC BY 4.0 : see CAreadme.txt
// 
// 0 BFC CERTIFY CCW
  [0,"BFC","CERTIFY"],
  [0,"BFC","CCW"],
// 
// 0 !HISTORY 1998-12-15 [PTadmin] Official Update 1998-10
// 0 !HISTORY 2002-03-23 [sbliss] Added BFC statement; merged headers from files in distributions LDraw 0.27 and Complete.
// 0 !HISTORY 2002-04-25 [PTadmin] Official Update 2002-02
// 0 !HISTORY 2004-12-14 [guyvivan] BFC CCW
// 0 !HISTORY 2005-12-28 [PTadmin] Official Update 2005-01
// 0 !HISTORY 2007-06-24 [PTadmin] Header formatted for Contributor Agreement
// 0 !HISTORY 2008-07-01 [PTadmin] Official Update 2008-01
// 
// 
// 4 16 1 1 0 0.9239 1 0.3827 0.9239 0 0.3827 1 0 0
  [4,16,1,1,0,0.9239,1,0.3827,0.9239,0,0.3827,1,0,0],
// 5 24 1 0 0 1 1 0 0.9239 0 0.3827 0.9239 0 -0.3827
  [5,24,1,0,0,1,1,0,0.9239,0,0.3827,0.9239,0,-0.3827],
// 4 16 0.9239 1 0.3827 0.7071 1 0.7071 0.7071 0 0.7071 0.9239 0 0.3827
  [4,16,0.9239,1,0.3827,0.7071,1,0.7071,0.7071,0,0.7071,0.9239,0,0.3827],
// 5 24 0.9239 0 0.3827 0.9239 1 0.3827 0.7071 0 0.7071 1 0 0
  [5,24,0.9239,0,0.3827,0.9239,1,0.3827,0.7071,0,0.7071,1,0,0],
// 4 16 0.7071 1 0.7071 0.3827 1 0.9239 0.3827 0 0.9239 0.7071 0 0.7071
  [4,16,0.7071,1,0.7071,0.3827,1,0.9239,0.3827,0,0.9239,0.7071,0,0.7071],
// 5 24 0.7071 0 0.7071 0.7071 1 0.7071 0.3827 0 0.9239 0.9239 0 0.3827
  [5,24,0.7071,0,0.7071,0.7071,1,0.7071,0.3827,0,0.9239,0.9239,0,0.3827],
// 4 16 0.3827 1 0.9239 0 1 1 0 0 1 0.3827 0 0.9239
  [4,16,0.3827,1,0.9239,0,1,1,0,0,1,0.3827,0,0.9239],
// 5 24 0.3827 0 0.9239 0.3827 1 0.9239 0 0 1 0.7071 0 0.7071
  [5,24,0.3827,0,0.9239,0.3827,1,0.9239,0,0,1,0.7071,0,0.7071],
// 4 16 0 1 1 -0.3827 1 0.9239 -0.3827 0 0.9239 0 0 1
  [4,16,0,1,1,-0.3827,1,0.9239,-0.3827,0,0.9239,0,0,1],
// 5 24 0 0 1 0 1 1 -0.3827 0 0.9239 0.3827 0 0.9239
  [5,24,0,0,1,0,1,1,-0.3827,0,0.9239,0.3827,0,0.9239],
// 4 16 -0.3827 1 0.9239 -0.7071 1 0.7071 -0.7071 0 0.7071 -0.3827 0 0.9239
  [4,16,-0.3827,1,0.9239,-0.7071,1,0.7071,-0.7071,0,0.7071,-0.3827,0,0.9239],
// 5 24 -0.3827 0 0.9239 -0.3827 1 0.9239 -0.7071 0 0.7071 0 0 1
  [5,24,-0.3827,0,0.9239,-0.3827,1,0.9239,-0.7071,0,0.7071,0,0,1],
// 4 16 -0.7071 1 0.7071 -0.9239 1 0.3827 -0.9239 0 0.3827 -0.7071 0 0.7071
  [4,16,-0.7071,1,0.7071,-0.9239,1,0.3827,-0.9239,0,0.3827,-0.7071,0,0.7071],
// 5 24 -0.7071 0 0.7071 -0.7071 1 0.7071 -0.9239 0 0.3827 -0.3827 0 0.9239
  [5,24,-0.7071,0,0.7071,-0.7071,1,0.7071,-0.9239,0,0.3827,-0.3827,0,0.9239],
// 4 16 -0.9239 1 0.3827 -1 1 0 -1 0 0 -0.9239 0 0.3827
  [4,16,-0.9239,1,0.3827,-1,1,0,-1,0,0,-0.9239,0,0.3827],
// 5 24 -0.9239 0 0.3827 -0.9239 1 0.3827 -1 0 0 -0.7071 0 0.7071
  [5,24,-0.9239,0,0.3827,-0.9239,1,0.3827,-1,0,0,-0.7071,0,0.7071],
// 4 16 -1 1 0 -0.9239 1 -0.3827 -0.9239 0 -0.3827 -1 0 0
  [4,16,-1,1,0,-0.9239,1,-0.3827,-0.9239,0,-0.3827,-1,0,0],
// 5 24 -1 0 0 -1 1 0 -0.9239 0 -0.3827 -0.9239 0 0.3827
  [5,24,-1,0,0,-1,1,0,-0.9239,0,-0.3827,-0.9239,0,0.3827],
// 4 16 -0.9239 1 -0.3827 -0.7071 1 -0.7071 -0.7071 0 -0.7071 -0.9239 0 -0.3827
  [4,16,-0.9239,1,-0.3827,-0.7071,1,-0.7071,-0.7071,0,-0.7071,-0.9239,0,-0.3827],
// 5 24 -0.9239 0 -0.3827 -0.9239 1 -0.3827 -0.7071 0 -0.7071 -1 0 0
  [5,24,-0.9239,0,-0.3827,-0.9239,1,-0.3827,-0.7071,0,-0.7071,-1,0,0],
// 4 16 -0.7071 1 -0.7071 -0.3827 1 -0.9239 -0.3827 0 -0.9239 -0.7071 0 -0.7071
  [4,16,-0.7071,1,-0.7071,-0.3827,1,-0.9239,-0.3827,0,-0.9239,-0.7071,0,-0.7071],
// 5 24 -0.7071 0 -0.7071 -0.7071 1 -0.7071 -0.3827 0 -0.9239 -0.9239 0 -0.3827
  [5,24,-0.7071,0,-0.7071,-0.7071,1,-0.7071,-0.3827,0,-0.9239,-0.9239,0,-0.3827],
// 4 16 -0.3827 1 -0.9239 0 1 -1 0 0 -1 -0.3827 0 -0.9239
  [4,16,-0.3827,1,-0.9239,0,1,-1,0,0,-1,-0.3827,0,-0.9239],
// 5 24 -0.3827 0 -0.9239 -0.3827 1 -0.9239 0 0 -1 -0.7071 0 -0.7071
  [5,24,-0.3827,0,-0.9239,-0.3827,1,-0.9239,0,0,-1,-0.7071,0,-0.7071],
// 4 16 0 1 -1 0.3827 1 -0.9239 0.3827 0 -0.9239 0 0 -1
  [4,16,0,1,-1,0.3827,1,-0.9239,0.3827,0,-0.9239,0,0,-1],
// 5 24 0 0 -1 0 1 -1 0.3827 0 -0.9239 -0.3827 0 -0.9239
  [5,24,0,0,-1,0,1,-1,0.3827,0,-0.9239,-0.3827,0,-0.9239],
// 4 16 0.3827 1 -0.9239 0.7071 1 -0.7071 0.7071 0 -0.7071 0.3827 0 -0.9239
  [4,16,0.3827,1,-0.9239,0.7071,1,-0.7071,0.7071,0,-0.7071,0.3827,0,-0.9239],
// 5 24 0.3827 0 -0.9239 0.3827 1 -0.9239 0.7071 0 -0.7071 0 0 -1
  [5,24,0.3827,0,-0.9239,0.3827,1,-0.9239,0.7071,0,-0.7071,0,0,-1],
// 4 16 0.7071 1 -0.7071 0.9239 1 -0.3827 0.9239 0 -0.3827 0.7071 0 -0.7071
  [4,16,0.7071,1,-0.7071,0.9239,1,-0.3827,0.9239,0,-0.3827,0.7071,0,-0.7071],
// 5 24 0.7071 0 -0.7071 0.7071 1 -0.7071 0.9239 0 -0.3827 0.3827 0 -0.9239
  [5,24,0.7071,0,-0.7071,0.7071,1,-0.7071,0.9239,0,-0.3827,0.3827,0,-0.9239],
// 4 16 0.9239 1 -0.3827 1 1 0 1 0 0 0.9239 0 -0.3827
  [4,16,0.9239,1,-0.3827,1,1,0,1,0,0,0.9239,0,-0.3827],
// 5 24 0.9239 0 -0.3827 0.9239 1 -0.3827 1 0 0 0.7071 0 -0.7071
  [5,24,0.9239,0,-0.3827,0.9239,1,-0.3827,1,0,0,0.7071,0,-0.7071],
// 0
];
module ldraw_lib__4_4cyli(step=0, col=false, unit=2/5, alt=false, line=0.2, solid=!$preview)
    makepoly(ldraw_lib__4_4cyli(solid), step=step, col=col, unit=unit, alt=alt, line=line, solid=solid);
ldraw_lib__4_4cyli(line=0.2);
// main file
use <../lib.scad>
use <../p/4-4cyli.scad>
use <../p/4-4disc.scad>
use <../p/4-4edge.scad>
use <../p/4-4ring1.scad>
use <../p/4-8sphe.scad>
$fa=1; $fs=0.2;
function ldraw_lib__14301k02(realsolid=false) = [
// 0 ~Hose Flexible 11.5L Segment
// 0 Name: 14301k02.dat
// 0 Author: Sylvain Sauvage [SLS]
// 0 !LDRAW_ORG Part Flexible_Section UPDATE 2018-02
// 0 !LICENSE Licensed under CC BY 2.0 and CC BY 4.0 : see CAreadme.txt
// 
// 0 BFC CERTIFY CCW
  [0,"BFC","CERTIFY"],
  [0,"BFC","CCW"],
// 
// 0 !HISTORY 2017-05-22 [SLS] Derived from 758.dat
// 0 !HISTORY 2018-12-08 [PTadmin] Official Update 2018-02
// 
// 
// 1 16 0 2.3541 0 4 0 0 0 1 0 0 0 4 4-4edge.dat
  [1,16,0,2.3541,0,4,0,0,0,1,0,0,0,4, ldraw_lib__4_4edge(realsolid)],
// 1 16 0 2.3541 0 8 0 0 0 1 0 0 0 8 4-4edge.dat
  [1,16,0,2.3541,0,8,0,0,0,1,0,0,0,8, ldraw_lib__4_4edge(realsolid)],
// 1 16 0 5.2444 0 -8 0 0 0 -1 0 0 0 8 4-4edge.dat
  [1,16,0,5.2444,0,-8,0,0,0,-1,0,0,0,8, ldraw_lib__4_4edge(realsolid)],
// 1 16 0 5.2444 0 -4 0 0 0 -1 0 0 0 4 4-4edge.dat
  [1,16,0,5.2444,0,-4,0,0,0,-1,0,0,0,4, ldraw_lib__4_4edge(realsolid)],
// 
// 1 16 0 2.3541 0 4 0 0 0 1 0 0 0 4 4-4ring1.dat
  [1,16,0,2.3541,0,4,0,0,0,1,0,0,0,4, ldraw_lib__4_4ring1(realsolid)],
// 1 16 0 2.3541 0 8 0 0 0 2.8903 0 0 0 8 4-4cyli.dat
  [1,16,0,2.3541,0,8,0,0,0,2.8903,0,0,0,8, ldraw_lib__4_4cyli(realsolid)],
// 1 16 0 5.2444 0 -8 0 0 0 -1 0 0 0 8 4-4disc.dat
  [1,16,0,5.2444,0,-8,0,0,0,-1,0,0,0,8, ldraw_lib__4_4disc(realsolid)],
// 
// 1 16 0 0 0 4 0 0 0 2.3541 0 0 0 4 4-4cyli.dat
  [1,16,0,0,0,4,0,0,0,2.3541,0,0,0,4, ldraw_lib__4_4cyli(realsolid)],
// 1 16 0 0 0 -4 0 0 0 -4 0 0 0 4 4-8sphe.dat
  [1,16,0,0,0,-4,0,0,0,-4,0,0,0,4, ldraw_lib__4_8sphe(realsolid)],
];
module ldraw_lib__14301k02(step=0, col=false, unit=2/5, alt=false, line=0.2, solid=!$preview)
    makepoly(ldraw_lib__14301k02(solid), step=step, col=col, unit=unit, alt=alt, line=line, solid=solid);
ldraw_lib__14301k02(line=0.2);
